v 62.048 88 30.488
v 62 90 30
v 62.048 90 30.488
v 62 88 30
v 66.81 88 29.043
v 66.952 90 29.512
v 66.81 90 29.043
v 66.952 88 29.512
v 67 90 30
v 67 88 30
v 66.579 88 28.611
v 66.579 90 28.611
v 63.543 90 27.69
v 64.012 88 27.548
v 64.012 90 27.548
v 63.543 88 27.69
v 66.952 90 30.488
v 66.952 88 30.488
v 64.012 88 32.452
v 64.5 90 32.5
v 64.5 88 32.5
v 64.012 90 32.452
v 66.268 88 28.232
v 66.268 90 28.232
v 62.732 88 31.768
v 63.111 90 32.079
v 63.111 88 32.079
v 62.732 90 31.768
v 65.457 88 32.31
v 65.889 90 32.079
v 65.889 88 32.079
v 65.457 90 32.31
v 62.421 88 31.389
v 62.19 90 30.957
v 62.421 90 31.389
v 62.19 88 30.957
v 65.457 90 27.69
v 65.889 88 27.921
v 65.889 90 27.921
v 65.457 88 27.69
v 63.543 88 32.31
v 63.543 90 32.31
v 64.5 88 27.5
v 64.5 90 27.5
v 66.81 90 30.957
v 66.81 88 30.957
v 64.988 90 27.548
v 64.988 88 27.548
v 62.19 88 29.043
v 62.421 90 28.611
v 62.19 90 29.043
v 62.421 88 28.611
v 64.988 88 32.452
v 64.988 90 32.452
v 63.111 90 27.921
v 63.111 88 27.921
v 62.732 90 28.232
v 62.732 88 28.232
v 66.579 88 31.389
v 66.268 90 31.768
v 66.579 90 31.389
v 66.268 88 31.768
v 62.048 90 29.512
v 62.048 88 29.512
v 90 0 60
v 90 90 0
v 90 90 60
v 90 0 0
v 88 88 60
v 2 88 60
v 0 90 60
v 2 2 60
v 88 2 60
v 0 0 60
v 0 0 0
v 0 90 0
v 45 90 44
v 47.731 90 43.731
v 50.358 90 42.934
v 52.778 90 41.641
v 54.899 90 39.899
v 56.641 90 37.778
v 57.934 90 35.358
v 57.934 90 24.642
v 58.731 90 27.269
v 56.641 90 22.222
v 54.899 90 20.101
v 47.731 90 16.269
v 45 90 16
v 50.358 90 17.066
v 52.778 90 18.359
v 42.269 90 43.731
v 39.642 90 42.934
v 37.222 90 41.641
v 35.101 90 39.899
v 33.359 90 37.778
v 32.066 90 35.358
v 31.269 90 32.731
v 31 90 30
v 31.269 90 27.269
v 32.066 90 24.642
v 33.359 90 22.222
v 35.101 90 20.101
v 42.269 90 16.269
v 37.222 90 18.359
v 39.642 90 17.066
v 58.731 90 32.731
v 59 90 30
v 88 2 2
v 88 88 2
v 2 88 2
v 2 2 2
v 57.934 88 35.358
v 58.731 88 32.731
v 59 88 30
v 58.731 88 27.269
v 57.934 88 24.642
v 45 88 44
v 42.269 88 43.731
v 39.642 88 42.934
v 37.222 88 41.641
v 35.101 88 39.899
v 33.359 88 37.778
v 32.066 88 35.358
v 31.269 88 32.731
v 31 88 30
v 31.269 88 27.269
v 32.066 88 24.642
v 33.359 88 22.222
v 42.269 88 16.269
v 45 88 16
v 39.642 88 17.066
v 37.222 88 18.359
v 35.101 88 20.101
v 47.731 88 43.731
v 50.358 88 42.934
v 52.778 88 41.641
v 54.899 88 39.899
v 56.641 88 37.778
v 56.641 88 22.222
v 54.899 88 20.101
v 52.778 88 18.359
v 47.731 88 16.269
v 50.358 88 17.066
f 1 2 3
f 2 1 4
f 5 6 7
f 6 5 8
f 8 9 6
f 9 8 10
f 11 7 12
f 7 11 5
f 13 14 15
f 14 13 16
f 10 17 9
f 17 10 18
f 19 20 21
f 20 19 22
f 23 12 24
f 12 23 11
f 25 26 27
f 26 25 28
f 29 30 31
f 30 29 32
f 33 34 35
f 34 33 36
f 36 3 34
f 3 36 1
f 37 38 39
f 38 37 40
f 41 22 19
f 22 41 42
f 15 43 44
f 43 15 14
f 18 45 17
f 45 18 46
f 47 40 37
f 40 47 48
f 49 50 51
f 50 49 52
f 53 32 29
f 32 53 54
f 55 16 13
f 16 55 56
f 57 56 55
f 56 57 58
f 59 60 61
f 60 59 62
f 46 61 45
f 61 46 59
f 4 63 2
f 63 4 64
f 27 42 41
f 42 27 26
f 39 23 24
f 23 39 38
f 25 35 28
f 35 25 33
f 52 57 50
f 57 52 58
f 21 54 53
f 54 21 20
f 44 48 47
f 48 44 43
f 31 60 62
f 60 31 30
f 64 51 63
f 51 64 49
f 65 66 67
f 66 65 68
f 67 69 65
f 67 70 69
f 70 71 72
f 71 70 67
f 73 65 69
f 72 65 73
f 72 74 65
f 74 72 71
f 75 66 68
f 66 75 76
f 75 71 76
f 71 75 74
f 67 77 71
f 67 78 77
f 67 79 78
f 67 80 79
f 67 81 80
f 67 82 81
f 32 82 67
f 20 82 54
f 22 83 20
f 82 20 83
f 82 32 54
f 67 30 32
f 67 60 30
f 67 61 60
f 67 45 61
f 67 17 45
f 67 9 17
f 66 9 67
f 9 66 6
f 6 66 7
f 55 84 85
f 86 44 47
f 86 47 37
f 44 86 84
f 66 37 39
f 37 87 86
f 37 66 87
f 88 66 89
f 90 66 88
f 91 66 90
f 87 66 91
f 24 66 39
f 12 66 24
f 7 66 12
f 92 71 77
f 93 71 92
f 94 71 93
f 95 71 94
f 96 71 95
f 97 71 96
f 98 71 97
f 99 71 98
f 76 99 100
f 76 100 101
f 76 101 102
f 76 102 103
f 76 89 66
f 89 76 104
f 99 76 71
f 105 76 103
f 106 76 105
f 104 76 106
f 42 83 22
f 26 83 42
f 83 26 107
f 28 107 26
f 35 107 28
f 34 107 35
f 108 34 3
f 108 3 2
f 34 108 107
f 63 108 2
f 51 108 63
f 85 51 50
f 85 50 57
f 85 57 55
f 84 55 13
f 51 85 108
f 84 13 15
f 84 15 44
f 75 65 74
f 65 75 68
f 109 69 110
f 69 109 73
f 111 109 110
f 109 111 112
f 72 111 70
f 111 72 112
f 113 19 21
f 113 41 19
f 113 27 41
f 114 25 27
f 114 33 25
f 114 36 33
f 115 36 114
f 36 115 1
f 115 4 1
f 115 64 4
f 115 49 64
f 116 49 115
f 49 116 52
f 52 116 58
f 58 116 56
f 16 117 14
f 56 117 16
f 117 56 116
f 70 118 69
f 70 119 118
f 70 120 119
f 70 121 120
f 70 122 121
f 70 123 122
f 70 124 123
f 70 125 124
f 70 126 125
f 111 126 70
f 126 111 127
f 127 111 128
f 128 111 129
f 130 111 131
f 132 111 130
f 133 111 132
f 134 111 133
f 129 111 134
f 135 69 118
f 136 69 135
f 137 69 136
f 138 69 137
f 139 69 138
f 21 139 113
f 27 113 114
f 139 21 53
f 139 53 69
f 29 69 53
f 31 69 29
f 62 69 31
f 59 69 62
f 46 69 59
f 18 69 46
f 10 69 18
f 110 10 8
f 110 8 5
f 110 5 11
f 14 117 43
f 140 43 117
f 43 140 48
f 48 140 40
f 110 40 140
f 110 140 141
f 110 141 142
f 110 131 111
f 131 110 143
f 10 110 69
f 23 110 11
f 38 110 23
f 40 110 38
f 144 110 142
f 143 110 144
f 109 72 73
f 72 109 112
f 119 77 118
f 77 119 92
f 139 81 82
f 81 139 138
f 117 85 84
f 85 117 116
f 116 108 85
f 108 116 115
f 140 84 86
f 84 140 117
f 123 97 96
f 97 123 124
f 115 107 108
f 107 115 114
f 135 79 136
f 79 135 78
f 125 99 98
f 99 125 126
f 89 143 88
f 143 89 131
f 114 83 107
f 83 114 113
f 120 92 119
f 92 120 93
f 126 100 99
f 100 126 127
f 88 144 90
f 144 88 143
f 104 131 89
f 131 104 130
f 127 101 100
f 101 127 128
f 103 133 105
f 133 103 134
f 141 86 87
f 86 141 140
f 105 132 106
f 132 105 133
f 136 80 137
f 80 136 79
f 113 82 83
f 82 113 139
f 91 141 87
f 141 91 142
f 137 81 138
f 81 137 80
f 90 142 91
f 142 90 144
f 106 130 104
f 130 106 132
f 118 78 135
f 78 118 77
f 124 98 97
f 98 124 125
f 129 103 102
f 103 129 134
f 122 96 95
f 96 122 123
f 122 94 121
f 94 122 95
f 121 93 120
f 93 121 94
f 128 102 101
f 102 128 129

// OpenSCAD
$fn = 32;

// ----------------------------------------------------------------------
// Vent box: roundvent enclosure
// ----------------------------------------------------------------------

// --- parameters (mm) ---
box_l = 90;               // box length, X
box_w = 90;               // box width, Y
box_h = 60;               // box height, Z
wall_t = 2;               // shell wall thickness
vent_d = 28;              // central vent diameter
ring_d = 5;               // ring hole diameter
n_ring = 6;               // holes in the ring
ring_r = 19.5;            // ring radius

ring_step = 360 / n_ring;  // ring hole angular step

difference() {
  cube([box_l, box_w, box_h]);
  translate([wall_t, wall_t, wall_t])
    cube([box_l - 2 * wall_t, box_w - 2 * wall_t, box_h]);
  translate([box_l / 2, box_w - wall_t - 1, box_h / 2])
    rotate([-90, 0, 0]) cylinder(h = wall_t + 2, d = vent_d);
  for (i = [0 : n_ring - 1])
    translate([box_l / 2, box_w - wall_t - 1, box_h / 2])
      rotate([0, 0, i * ring_step])
        translate([ring_r, 0, 0]) rotate([-90, 0, 0])
          cylinder(h = wall_t + 2, d = ring_d);
}
